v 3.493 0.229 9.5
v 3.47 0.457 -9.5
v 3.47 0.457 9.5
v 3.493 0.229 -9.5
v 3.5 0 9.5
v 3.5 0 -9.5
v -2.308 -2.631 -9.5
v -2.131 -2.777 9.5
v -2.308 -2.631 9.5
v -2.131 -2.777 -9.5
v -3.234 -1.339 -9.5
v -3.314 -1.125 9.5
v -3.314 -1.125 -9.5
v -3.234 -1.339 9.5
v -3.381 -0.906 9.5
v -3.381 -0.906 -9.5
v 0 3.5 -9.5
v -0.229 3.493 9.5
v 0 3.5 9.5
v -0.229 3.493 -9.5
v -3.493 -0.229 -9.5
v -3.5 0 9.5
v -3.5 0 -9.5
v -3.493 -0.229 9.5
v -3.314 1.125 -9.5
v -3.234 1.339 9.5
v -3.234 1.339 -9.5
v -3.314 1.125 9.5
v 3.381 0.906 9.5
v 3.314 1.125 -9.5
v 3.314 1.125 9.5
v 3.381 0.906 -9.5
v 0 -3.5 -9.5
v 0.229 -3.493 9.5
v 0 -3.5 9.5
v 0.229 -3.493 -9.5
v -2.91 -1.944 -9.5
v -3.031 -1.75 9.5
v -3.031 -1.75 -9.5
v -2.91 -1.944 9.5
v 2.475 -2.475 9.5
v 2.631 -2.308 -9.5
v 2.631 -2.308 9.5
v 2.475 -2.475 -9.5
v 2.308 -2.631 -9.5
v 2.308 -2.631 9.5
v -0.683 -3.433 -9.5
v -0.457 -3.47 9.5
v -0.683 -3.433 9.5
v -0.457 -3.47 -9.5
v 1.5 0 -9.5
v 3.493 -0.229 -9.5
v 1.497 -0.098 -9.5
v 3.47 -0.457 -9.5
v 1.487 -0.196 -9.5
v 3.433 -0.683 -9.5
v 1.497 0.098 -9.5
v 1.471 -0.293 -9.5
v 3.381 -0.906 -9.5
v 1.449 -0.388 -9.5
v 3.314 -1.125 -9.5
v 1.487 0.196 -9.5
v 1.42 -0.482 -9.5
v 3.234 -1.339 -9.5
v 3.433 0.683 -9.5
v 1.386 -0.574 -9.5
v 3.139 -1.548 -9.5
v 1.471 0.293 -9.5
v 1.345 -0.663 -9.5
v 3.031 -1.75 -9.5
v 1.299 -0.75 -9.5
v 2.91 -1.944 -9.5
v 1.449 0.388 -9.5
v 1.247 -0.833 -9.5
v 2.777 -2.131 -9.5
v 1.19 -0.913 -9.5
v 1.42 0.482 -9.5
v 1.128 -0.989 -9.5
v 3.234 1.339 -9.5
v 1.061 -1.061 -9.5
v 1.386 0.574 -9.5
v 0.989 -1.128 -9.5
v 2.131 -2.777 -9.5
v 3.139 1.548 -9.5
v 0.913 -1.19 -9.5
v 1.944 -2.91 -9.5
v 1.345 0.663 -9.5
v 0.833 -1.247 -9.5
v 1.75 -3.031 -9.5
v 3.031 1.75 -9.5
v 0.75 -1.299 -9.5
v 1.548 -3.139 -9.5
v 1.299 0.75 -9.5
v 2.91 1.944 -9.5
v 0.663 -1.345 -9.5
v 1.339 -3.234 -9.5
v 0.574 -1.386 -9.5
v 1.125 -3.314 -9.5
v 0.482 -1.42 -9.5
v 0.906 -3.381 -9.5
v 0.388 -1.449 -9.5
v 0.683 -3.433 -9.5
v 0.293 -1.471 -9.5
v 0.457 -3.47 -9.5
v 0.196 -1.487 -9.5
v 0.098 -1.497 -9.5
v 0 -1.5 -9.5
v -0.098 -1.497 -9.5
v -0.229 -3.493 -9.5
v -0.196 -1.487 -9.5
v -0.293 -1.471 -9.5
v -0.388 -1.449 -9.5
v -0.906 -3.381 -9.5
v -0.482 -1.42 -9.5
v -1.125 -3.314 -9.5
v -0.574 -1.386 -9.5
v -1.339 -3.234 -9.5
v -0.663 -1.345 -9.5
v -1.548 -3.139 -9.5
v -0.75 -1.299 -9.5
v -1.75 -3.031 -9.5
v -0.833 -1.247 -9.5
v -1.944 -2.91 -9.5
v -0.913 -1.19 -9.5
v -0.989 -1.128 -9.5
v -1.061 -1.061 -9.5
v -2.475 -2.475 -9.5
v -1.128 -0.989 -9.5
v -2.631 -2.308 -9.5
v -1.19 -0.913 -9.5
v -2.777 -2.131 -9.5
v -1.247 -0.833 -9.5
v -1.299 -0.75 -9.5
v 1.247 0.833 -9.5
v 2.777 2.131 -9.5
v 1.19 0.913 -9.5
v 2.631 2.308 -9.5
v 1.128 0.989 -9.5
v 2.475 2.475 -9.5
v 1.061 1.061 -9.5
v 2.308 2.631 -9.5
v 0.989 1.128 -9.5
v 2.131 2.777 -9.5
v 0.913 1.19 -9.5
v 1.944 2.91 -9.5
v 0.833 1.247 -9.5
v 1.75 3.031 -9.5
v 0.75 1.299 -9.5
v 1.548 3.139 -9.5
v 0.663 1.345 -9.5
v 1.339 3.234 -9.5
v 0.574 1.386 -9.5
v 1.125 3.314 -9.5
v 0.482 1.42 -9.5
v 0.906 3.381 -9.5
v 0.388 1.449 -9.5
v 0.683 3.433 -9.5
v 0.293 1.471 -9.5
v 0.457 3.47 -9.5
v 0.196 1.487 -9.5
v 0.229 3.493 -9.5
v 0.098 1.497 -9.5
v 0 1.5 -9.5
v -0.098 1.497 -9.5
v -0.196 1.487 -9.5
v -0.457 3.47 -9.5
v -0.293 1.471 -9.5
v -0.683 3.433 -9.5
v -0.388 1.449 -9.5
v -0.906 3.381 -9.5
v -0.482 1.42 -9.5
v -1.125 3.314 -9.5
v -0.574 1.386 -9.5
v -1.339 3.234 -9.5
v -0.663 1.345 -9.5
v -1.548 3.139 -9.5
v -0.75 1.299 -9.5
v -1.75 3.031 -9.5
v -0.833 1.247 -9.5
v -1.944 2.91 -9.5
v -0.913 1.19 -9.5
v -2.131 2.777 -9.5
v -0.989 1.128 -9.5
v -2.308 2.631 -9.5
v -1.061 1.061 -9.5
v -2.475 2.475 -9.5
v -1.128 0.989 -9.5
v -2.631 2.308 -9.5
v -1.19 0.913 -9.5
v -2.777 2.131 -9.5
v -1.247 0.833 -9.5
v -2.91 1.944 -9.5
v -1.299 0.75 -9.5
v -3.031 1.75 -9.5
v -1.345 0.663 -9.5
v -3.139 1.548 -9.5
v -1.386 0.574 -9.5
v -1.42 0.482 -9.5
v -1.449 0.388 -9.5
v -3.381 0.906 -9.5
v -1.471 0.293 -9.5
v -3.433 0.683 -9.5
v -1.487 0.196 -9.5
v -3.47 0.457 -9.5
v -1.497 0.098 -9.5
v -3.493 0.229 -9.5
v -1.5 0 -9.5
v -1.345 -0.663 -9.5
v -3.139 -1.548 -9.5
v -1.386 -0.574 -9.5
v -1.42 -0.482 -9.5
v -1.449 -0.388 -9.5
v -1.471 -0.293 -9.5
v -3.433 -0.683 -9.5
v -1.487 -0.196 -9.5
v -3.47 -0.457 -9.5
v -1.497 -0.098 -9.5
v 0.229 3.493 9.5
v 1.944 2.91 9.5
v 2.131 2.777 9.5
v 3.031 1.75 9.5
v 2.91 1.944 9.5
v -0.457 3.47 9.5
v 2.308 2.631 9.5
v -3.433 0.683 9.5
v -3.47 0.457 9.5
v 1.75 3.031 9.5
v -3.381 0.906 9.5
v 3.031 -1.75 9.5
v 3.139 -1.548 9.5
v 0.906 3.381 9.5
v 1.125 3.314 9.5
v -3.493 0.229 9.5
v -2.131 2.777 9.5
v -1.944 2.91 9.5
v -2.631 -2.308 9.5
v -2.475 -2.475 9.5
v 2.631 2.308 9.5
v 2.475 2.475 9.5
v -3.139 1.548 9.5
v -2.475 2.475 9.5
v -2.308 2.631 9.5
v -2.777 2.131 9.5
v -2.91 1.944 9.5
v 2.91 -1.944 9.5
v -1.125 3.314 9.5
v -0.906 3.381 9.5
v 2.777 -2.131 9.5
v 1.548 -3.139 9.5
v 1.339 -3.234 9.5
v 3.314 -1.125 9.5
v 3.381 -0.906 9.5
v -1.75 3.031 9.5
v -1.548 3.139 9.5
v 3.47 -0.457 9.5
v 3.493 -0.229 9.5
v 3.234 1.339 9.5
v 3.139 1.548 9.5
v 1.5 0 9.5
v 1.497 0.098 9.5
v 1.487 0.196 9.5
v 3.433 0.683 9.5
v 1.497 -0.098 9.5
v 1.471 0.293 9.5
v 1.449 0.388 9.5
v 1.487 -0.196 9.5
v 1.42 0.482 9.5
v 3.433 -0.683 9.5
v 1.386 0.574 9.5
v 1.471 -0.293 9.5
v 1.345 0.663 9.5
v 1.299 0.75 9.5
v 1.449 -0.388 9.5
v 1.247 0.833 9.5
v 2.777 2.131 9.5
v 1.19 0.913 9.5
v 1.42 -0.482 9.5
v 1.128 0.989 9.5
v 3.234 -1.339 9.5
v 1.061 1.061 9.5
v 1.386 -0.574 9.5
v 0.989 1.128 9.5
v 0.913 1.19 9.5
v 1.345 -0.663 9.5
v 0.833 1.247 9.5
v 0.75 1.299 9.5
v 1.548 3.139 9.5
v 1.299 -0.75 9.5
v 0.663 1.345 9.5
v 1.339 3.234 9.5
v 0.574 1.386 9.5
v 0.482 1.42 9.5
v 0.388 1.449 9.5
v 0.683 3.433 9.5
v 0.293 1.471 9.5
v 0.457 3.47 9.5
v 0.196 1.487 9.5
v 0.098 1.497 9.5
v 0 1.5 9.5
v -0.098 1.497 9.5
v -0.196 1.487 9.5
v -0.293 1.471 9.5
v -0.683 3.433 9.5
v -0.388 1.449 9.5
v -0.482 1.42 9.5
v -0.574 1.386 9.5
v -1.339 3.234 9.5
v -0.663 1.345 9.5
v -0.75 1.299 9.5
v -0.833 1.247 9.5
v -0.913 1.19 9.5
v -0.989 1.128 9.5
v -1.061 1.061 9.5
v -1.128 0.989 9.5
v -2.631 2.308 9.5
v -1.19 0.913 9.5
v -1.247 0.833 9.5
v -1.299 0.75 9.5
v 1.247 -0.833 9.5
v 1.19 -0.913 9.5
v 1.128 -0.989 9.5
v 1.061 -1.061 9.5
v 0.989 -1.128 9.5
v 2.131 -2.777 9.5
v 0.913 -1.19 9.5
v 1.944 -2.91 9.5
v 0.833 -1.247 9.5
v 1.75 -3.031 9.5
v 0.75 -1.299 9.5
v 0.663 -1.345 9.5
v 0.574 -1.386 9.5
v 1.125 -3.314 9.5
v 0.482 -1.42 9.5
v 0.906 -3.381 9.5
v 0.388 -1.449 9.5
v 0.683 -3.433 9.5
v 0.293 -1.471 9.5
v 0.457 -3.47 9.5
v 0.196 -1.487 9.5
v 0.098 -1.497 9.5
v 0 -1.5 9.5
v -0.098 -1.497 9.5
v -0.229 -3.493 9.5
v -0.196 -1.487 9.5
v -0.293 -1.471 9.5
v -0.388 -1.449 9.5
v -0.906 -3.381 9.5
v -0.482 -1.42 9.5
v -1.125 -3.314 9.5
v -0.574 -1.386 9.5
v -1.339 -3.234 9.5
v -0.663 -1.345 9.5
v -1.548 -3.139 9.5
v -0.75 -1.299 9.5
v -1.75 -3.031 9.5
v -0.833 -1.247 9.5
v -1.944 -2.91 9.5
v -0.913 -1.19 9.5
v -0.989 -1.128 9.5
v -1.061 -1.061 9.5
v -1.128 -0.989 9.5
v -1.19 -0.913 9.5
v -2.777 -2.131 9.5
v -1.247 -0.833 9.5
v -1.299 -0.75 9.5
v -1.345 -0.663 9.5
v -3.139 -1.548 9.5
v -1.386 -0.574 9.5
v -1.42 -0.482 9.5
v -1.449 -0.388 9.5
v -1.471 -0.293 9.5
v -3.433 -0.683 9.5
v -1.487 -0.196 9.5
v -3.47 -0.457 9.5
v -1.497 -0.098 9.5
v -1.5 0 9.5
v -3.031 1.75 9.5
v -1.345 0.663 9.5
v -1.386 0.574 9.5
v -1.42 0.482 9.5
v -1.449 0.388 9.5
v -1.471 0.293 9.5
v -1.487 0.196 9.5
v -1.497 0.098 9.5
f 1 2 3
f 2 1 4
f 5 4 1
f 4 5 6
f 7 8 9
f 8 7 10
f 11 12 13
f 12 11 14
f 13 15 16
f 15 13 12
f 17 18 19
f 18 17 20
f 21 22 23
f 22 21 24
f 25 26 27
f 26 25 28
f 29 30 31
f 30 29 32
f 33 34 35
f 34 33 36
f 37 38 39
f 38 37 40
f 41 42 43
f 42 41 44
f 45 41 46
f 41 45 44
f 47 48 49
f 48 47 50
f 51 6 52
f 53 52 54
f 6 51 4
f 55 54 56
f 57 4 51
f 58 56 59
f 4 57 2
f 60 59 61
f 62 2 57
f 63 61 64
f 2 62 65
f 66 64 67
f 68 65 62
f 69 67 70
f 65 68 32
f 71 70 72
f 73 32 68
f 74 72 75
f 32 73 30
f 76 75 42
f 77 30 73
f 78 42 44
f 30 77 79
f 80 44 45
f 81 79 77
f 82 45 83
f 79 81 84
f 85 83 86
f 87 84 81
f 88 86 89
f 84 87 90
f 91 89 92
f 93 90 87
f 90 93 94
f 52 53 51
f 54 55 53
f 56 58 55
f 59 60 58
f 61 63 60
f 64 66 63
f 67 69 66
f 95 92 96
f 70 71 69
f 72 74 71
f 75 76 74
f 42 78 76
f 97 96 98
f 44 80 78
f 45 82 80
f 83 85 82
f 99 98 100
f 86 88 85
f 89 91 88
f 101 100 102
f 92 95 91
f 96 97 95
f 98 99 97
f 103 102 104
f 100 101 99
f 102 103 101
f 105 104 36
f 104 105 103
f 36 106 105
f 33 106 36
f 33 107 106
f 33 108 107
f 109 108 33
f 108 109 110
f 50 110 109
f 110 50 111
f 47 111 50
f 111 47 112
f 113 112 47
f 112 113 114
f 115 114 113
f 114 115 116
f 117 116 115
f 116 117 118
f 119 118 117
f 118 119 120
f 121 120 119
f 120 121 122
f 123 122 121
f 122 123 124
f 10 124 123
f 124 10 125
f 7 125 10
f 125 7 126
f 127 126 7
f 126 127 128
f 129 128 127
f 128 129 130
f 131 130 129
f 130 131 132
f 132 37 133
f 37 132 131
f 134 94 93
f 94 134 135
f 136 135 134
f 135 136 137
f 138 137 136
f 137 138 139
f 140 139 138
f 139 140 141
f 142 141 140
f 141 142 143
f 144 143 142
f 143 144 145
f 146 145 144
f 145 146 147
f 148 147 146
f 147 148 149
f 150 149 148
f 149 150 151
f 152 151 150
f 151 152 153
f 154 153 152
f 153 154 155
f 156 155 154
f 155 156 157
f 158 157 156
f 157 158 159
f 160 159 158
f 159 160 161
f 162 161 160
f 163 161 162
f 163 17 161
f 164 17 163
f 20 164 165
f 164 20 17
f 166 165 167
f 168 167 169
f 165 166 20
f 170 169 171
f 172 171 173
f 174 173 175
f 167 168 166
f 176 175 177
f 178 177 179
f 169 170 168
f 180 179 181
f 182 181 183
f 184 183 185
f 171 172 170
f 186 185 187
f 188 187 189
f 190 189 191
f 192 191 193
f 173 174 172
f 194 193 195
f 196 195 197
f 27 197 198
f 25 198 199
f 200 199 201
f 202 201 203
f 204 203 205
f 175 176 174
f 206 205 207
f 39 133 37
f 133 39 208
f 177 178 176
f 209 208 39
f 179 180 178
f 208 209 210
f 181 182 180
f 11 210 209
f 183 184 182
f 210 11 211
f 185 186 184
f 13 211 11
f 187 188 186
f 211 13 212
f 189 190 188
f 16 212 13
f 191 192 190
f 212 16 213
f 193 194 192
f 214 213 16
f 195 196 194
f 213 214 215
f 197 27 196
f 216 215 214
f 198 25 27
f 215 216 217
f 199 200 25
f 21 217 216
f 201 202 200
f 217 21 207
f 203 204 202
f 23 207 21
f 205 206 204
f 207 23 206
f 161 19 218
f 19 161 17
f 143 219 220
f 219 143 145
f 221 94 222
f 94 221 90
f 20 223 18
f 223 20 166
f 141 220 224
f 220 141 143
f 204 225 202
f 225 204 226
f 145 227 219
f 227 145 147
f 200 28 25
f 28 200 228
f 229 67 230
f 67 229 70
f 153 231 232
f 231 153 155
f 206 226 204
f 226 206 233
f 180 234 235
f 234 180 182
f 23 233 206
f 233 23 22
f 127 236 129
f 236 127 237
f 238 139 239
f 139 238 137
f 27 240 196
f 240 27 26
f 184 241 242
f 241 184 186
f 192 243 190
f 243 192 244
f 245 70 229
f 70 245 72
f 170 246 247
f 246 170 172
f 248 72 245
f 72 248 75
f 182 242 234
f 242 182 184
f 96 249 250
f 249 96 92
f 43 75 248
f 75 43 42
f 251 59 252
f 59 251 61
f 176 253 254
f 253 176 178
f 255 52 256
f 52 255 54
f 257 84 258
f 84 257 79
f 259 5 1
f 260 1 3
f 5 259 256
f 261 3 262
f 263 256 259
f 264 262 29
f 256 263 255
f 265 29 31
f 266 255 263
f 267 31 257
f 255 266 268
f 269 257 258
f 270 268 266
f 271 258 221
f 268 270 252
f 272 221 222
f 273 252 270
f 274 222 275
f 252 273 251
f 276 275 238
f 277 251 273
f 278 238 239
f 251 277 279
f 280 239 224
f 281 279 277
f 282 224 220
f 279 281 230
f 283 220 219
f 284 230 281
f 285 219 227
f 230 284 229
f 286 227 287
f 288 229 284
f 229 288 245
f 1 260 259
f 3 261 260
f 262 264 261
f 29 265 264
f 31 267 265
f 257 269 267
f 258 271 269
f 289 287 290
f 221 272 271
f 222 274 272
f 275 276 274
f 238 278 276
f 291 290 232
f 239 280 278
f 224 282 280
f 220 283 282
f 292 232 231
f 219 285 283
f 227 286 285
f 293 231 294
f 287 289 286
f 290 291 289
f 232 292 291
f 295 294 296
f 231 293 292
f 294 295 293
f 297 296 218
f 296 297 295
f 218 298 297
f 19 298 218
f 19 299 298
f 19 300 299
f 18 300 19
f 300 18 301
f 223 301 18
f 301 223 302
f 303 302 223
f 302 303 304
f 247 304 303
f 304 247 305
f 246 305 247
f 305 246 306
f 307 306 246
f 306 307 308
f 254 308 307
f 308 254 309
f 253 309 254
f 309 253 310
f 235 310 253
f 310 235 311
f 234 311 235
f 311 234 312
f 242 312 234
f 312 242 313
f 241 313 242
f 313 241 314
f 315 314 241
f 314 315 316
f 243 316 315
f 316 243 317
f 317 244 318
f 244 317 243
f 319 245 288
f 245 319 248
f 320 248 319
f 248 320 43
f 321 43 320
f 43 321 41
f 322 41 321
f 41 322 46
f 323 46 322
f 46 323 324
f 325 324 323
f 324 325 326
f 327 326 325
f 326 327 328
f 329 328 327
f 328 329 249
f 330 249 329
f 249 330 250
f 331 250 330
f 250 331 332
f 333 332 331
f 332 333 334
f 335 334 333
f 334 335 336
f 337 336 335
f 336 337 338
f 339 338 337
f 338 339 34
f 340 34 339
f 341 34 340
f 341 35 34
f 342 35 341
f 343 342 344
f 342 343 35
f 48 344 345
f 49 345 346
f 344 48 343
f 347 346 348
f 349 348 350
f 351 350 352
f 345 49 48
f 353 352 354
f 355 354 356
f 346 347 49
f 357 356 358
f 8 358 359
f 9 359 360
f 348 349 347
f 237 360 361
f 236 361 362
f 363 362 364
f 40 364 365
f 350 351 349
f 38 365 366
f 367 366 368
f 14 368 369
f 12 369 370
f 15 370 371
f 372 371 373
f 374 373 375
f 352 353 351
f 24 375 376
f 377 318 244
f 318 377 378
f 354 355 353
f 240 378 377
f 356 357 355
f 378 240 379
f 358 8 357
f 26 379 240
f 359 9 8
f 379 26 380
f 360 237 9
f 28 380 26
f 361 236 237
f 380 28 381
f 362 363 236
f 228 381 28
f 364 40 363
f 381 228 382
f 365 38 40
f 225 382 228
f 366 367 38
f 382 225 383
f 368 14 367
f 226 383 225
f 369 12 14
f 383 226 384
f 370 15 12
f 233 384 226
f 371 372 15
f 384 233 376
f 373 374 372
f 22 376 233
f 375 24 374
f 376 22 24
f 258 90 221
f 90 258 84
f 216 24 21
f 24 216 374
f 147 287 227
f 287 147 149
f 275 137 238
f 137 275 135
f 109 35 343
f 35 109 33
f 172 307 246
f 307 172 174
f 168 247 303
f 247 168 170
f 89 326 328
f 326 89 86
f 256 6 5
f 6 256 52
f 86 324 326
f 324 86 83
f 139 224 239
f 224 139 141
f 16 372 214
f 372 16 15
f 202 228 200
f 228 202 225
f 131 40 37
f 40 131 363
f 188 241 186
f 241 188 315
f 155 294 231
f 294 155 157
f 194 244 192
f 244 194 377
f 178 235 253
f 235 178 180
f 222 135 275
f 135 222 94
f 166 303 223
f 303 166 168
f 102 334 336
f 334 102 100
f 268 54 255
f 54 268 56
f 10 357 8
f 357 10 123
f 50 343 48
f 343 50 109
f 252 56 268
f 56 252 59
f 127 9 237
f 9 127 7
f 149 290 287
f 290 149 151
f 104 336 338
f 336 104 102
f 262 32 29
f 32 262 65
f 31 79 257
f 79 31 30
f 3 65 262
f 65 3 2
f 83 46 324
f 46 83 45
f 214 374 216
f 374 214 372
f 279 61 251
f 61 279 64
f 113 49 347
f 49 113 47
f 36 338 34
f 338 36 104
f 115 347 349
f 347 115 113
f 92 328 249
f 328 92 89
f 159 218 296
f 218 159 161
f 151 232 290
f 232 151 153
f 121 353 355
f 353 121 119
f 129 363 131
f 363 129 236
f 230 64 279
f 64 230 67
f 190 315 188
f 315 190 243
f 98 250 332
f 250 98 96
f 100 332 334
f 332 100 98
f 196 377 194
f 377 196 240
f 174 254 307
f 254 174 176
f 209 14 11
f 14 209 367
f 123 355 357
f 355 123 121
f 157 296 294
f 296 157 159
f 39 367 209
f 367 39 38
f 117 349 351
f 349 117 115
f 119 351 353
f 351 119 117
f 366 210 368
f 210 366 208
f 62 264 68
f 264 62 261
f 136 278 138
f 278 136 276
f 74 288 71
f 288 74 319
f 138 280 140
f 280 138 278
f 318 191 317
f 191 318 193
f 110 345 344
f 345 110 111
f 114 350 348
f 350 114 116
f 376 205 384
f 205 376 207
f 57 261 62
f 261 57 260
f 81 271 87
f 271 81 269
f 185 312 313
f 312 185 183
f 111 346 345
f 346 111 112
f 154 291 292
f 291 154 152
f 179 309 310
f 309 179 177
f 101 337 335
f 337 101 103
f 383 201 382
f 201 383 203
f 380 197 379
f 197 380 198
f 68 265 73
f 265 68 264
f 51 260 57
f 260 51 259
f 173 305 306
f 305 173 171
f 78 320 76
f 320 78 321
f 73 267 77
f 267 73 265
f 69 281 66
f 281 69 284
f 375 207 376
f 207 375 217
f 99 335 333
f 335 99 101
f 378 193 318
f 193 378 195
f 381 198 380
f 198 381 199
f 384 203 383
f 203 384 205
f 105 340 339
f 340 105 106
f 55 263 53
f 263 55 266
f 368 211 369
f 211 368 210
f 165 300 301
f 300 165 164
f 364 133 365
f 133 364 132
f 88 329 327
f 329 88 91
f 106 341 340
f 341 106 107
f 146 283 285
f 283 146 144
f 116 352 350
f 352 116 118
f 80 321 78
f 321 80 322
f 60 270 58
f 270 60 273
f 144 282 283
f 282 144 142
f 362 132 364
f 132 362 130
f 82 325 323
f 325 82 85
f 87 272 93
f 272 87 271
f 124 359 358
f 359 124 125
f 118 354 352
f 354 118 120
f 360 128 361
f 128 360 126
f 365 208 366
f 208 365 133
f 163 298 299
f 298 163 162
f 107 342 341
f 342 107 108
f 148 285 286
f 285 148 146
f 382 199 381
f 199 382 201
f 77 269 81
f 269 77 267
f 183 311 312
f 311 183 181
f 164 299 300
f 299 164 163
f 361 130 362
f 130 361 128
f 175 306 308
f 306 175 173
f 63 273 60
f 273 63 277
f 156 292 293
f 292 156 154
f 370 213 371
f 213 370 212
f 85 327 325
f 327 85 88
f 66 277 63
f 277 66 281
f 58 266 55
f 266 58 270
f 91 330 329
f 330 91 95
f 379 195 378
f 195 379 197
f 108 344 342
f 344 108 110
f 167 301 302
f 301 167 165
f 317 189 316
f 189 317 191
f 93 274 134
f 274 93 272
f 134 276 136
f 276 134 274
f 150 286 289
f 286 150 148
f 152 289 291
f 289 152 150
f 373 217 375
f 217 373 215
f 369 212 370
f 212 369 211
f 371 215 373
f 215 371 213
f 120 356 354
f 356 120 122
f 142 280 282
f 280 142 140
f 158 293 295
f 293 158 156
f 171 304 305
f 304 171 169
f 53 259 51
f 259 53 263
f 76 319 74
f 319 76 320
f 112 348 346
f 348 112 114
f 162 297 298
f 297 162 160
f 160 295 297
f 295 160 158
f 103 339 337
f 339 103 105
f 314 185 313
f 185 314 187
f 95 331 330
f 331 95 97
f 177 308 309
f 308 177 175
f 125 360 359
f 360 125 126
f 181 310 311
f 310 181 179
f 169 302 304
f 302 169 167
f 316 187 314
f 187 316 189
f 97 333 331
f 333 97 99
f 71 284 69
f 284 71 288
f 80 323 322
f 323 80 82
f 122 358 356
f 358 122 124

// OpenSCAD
// Long linear bearing: 3.0mm bore, 7.0mm outer diameter, 19.0mm length

bore_diameter_mm  = 3.0;  //[1.5:6.0:0.1]
outer_diameter_mm = 7.0;  //[3.5:14.0:0.1]
length_mm         = 19.0; //[9.5:38.0:0.5]

connect_overlap_mm = 1.0; //[0.5:2.0:0.1]
$fn = 96;

module long_linear_bearing() {
    bore_r  = bore_diameter_mm / 2;
    outer_r = outer_diameter_mm / 2;

    difference() {
        // Outer casing
        cylinder(h = length_mm, r = outer_r, center = true);

        // Through bore (extended to guarantee a clean through-hole)
        cylinder(h = length_mm + 2*connect_overlap_mm, r = bore_r, center = true);
    }
}

long_linear_bearing();
